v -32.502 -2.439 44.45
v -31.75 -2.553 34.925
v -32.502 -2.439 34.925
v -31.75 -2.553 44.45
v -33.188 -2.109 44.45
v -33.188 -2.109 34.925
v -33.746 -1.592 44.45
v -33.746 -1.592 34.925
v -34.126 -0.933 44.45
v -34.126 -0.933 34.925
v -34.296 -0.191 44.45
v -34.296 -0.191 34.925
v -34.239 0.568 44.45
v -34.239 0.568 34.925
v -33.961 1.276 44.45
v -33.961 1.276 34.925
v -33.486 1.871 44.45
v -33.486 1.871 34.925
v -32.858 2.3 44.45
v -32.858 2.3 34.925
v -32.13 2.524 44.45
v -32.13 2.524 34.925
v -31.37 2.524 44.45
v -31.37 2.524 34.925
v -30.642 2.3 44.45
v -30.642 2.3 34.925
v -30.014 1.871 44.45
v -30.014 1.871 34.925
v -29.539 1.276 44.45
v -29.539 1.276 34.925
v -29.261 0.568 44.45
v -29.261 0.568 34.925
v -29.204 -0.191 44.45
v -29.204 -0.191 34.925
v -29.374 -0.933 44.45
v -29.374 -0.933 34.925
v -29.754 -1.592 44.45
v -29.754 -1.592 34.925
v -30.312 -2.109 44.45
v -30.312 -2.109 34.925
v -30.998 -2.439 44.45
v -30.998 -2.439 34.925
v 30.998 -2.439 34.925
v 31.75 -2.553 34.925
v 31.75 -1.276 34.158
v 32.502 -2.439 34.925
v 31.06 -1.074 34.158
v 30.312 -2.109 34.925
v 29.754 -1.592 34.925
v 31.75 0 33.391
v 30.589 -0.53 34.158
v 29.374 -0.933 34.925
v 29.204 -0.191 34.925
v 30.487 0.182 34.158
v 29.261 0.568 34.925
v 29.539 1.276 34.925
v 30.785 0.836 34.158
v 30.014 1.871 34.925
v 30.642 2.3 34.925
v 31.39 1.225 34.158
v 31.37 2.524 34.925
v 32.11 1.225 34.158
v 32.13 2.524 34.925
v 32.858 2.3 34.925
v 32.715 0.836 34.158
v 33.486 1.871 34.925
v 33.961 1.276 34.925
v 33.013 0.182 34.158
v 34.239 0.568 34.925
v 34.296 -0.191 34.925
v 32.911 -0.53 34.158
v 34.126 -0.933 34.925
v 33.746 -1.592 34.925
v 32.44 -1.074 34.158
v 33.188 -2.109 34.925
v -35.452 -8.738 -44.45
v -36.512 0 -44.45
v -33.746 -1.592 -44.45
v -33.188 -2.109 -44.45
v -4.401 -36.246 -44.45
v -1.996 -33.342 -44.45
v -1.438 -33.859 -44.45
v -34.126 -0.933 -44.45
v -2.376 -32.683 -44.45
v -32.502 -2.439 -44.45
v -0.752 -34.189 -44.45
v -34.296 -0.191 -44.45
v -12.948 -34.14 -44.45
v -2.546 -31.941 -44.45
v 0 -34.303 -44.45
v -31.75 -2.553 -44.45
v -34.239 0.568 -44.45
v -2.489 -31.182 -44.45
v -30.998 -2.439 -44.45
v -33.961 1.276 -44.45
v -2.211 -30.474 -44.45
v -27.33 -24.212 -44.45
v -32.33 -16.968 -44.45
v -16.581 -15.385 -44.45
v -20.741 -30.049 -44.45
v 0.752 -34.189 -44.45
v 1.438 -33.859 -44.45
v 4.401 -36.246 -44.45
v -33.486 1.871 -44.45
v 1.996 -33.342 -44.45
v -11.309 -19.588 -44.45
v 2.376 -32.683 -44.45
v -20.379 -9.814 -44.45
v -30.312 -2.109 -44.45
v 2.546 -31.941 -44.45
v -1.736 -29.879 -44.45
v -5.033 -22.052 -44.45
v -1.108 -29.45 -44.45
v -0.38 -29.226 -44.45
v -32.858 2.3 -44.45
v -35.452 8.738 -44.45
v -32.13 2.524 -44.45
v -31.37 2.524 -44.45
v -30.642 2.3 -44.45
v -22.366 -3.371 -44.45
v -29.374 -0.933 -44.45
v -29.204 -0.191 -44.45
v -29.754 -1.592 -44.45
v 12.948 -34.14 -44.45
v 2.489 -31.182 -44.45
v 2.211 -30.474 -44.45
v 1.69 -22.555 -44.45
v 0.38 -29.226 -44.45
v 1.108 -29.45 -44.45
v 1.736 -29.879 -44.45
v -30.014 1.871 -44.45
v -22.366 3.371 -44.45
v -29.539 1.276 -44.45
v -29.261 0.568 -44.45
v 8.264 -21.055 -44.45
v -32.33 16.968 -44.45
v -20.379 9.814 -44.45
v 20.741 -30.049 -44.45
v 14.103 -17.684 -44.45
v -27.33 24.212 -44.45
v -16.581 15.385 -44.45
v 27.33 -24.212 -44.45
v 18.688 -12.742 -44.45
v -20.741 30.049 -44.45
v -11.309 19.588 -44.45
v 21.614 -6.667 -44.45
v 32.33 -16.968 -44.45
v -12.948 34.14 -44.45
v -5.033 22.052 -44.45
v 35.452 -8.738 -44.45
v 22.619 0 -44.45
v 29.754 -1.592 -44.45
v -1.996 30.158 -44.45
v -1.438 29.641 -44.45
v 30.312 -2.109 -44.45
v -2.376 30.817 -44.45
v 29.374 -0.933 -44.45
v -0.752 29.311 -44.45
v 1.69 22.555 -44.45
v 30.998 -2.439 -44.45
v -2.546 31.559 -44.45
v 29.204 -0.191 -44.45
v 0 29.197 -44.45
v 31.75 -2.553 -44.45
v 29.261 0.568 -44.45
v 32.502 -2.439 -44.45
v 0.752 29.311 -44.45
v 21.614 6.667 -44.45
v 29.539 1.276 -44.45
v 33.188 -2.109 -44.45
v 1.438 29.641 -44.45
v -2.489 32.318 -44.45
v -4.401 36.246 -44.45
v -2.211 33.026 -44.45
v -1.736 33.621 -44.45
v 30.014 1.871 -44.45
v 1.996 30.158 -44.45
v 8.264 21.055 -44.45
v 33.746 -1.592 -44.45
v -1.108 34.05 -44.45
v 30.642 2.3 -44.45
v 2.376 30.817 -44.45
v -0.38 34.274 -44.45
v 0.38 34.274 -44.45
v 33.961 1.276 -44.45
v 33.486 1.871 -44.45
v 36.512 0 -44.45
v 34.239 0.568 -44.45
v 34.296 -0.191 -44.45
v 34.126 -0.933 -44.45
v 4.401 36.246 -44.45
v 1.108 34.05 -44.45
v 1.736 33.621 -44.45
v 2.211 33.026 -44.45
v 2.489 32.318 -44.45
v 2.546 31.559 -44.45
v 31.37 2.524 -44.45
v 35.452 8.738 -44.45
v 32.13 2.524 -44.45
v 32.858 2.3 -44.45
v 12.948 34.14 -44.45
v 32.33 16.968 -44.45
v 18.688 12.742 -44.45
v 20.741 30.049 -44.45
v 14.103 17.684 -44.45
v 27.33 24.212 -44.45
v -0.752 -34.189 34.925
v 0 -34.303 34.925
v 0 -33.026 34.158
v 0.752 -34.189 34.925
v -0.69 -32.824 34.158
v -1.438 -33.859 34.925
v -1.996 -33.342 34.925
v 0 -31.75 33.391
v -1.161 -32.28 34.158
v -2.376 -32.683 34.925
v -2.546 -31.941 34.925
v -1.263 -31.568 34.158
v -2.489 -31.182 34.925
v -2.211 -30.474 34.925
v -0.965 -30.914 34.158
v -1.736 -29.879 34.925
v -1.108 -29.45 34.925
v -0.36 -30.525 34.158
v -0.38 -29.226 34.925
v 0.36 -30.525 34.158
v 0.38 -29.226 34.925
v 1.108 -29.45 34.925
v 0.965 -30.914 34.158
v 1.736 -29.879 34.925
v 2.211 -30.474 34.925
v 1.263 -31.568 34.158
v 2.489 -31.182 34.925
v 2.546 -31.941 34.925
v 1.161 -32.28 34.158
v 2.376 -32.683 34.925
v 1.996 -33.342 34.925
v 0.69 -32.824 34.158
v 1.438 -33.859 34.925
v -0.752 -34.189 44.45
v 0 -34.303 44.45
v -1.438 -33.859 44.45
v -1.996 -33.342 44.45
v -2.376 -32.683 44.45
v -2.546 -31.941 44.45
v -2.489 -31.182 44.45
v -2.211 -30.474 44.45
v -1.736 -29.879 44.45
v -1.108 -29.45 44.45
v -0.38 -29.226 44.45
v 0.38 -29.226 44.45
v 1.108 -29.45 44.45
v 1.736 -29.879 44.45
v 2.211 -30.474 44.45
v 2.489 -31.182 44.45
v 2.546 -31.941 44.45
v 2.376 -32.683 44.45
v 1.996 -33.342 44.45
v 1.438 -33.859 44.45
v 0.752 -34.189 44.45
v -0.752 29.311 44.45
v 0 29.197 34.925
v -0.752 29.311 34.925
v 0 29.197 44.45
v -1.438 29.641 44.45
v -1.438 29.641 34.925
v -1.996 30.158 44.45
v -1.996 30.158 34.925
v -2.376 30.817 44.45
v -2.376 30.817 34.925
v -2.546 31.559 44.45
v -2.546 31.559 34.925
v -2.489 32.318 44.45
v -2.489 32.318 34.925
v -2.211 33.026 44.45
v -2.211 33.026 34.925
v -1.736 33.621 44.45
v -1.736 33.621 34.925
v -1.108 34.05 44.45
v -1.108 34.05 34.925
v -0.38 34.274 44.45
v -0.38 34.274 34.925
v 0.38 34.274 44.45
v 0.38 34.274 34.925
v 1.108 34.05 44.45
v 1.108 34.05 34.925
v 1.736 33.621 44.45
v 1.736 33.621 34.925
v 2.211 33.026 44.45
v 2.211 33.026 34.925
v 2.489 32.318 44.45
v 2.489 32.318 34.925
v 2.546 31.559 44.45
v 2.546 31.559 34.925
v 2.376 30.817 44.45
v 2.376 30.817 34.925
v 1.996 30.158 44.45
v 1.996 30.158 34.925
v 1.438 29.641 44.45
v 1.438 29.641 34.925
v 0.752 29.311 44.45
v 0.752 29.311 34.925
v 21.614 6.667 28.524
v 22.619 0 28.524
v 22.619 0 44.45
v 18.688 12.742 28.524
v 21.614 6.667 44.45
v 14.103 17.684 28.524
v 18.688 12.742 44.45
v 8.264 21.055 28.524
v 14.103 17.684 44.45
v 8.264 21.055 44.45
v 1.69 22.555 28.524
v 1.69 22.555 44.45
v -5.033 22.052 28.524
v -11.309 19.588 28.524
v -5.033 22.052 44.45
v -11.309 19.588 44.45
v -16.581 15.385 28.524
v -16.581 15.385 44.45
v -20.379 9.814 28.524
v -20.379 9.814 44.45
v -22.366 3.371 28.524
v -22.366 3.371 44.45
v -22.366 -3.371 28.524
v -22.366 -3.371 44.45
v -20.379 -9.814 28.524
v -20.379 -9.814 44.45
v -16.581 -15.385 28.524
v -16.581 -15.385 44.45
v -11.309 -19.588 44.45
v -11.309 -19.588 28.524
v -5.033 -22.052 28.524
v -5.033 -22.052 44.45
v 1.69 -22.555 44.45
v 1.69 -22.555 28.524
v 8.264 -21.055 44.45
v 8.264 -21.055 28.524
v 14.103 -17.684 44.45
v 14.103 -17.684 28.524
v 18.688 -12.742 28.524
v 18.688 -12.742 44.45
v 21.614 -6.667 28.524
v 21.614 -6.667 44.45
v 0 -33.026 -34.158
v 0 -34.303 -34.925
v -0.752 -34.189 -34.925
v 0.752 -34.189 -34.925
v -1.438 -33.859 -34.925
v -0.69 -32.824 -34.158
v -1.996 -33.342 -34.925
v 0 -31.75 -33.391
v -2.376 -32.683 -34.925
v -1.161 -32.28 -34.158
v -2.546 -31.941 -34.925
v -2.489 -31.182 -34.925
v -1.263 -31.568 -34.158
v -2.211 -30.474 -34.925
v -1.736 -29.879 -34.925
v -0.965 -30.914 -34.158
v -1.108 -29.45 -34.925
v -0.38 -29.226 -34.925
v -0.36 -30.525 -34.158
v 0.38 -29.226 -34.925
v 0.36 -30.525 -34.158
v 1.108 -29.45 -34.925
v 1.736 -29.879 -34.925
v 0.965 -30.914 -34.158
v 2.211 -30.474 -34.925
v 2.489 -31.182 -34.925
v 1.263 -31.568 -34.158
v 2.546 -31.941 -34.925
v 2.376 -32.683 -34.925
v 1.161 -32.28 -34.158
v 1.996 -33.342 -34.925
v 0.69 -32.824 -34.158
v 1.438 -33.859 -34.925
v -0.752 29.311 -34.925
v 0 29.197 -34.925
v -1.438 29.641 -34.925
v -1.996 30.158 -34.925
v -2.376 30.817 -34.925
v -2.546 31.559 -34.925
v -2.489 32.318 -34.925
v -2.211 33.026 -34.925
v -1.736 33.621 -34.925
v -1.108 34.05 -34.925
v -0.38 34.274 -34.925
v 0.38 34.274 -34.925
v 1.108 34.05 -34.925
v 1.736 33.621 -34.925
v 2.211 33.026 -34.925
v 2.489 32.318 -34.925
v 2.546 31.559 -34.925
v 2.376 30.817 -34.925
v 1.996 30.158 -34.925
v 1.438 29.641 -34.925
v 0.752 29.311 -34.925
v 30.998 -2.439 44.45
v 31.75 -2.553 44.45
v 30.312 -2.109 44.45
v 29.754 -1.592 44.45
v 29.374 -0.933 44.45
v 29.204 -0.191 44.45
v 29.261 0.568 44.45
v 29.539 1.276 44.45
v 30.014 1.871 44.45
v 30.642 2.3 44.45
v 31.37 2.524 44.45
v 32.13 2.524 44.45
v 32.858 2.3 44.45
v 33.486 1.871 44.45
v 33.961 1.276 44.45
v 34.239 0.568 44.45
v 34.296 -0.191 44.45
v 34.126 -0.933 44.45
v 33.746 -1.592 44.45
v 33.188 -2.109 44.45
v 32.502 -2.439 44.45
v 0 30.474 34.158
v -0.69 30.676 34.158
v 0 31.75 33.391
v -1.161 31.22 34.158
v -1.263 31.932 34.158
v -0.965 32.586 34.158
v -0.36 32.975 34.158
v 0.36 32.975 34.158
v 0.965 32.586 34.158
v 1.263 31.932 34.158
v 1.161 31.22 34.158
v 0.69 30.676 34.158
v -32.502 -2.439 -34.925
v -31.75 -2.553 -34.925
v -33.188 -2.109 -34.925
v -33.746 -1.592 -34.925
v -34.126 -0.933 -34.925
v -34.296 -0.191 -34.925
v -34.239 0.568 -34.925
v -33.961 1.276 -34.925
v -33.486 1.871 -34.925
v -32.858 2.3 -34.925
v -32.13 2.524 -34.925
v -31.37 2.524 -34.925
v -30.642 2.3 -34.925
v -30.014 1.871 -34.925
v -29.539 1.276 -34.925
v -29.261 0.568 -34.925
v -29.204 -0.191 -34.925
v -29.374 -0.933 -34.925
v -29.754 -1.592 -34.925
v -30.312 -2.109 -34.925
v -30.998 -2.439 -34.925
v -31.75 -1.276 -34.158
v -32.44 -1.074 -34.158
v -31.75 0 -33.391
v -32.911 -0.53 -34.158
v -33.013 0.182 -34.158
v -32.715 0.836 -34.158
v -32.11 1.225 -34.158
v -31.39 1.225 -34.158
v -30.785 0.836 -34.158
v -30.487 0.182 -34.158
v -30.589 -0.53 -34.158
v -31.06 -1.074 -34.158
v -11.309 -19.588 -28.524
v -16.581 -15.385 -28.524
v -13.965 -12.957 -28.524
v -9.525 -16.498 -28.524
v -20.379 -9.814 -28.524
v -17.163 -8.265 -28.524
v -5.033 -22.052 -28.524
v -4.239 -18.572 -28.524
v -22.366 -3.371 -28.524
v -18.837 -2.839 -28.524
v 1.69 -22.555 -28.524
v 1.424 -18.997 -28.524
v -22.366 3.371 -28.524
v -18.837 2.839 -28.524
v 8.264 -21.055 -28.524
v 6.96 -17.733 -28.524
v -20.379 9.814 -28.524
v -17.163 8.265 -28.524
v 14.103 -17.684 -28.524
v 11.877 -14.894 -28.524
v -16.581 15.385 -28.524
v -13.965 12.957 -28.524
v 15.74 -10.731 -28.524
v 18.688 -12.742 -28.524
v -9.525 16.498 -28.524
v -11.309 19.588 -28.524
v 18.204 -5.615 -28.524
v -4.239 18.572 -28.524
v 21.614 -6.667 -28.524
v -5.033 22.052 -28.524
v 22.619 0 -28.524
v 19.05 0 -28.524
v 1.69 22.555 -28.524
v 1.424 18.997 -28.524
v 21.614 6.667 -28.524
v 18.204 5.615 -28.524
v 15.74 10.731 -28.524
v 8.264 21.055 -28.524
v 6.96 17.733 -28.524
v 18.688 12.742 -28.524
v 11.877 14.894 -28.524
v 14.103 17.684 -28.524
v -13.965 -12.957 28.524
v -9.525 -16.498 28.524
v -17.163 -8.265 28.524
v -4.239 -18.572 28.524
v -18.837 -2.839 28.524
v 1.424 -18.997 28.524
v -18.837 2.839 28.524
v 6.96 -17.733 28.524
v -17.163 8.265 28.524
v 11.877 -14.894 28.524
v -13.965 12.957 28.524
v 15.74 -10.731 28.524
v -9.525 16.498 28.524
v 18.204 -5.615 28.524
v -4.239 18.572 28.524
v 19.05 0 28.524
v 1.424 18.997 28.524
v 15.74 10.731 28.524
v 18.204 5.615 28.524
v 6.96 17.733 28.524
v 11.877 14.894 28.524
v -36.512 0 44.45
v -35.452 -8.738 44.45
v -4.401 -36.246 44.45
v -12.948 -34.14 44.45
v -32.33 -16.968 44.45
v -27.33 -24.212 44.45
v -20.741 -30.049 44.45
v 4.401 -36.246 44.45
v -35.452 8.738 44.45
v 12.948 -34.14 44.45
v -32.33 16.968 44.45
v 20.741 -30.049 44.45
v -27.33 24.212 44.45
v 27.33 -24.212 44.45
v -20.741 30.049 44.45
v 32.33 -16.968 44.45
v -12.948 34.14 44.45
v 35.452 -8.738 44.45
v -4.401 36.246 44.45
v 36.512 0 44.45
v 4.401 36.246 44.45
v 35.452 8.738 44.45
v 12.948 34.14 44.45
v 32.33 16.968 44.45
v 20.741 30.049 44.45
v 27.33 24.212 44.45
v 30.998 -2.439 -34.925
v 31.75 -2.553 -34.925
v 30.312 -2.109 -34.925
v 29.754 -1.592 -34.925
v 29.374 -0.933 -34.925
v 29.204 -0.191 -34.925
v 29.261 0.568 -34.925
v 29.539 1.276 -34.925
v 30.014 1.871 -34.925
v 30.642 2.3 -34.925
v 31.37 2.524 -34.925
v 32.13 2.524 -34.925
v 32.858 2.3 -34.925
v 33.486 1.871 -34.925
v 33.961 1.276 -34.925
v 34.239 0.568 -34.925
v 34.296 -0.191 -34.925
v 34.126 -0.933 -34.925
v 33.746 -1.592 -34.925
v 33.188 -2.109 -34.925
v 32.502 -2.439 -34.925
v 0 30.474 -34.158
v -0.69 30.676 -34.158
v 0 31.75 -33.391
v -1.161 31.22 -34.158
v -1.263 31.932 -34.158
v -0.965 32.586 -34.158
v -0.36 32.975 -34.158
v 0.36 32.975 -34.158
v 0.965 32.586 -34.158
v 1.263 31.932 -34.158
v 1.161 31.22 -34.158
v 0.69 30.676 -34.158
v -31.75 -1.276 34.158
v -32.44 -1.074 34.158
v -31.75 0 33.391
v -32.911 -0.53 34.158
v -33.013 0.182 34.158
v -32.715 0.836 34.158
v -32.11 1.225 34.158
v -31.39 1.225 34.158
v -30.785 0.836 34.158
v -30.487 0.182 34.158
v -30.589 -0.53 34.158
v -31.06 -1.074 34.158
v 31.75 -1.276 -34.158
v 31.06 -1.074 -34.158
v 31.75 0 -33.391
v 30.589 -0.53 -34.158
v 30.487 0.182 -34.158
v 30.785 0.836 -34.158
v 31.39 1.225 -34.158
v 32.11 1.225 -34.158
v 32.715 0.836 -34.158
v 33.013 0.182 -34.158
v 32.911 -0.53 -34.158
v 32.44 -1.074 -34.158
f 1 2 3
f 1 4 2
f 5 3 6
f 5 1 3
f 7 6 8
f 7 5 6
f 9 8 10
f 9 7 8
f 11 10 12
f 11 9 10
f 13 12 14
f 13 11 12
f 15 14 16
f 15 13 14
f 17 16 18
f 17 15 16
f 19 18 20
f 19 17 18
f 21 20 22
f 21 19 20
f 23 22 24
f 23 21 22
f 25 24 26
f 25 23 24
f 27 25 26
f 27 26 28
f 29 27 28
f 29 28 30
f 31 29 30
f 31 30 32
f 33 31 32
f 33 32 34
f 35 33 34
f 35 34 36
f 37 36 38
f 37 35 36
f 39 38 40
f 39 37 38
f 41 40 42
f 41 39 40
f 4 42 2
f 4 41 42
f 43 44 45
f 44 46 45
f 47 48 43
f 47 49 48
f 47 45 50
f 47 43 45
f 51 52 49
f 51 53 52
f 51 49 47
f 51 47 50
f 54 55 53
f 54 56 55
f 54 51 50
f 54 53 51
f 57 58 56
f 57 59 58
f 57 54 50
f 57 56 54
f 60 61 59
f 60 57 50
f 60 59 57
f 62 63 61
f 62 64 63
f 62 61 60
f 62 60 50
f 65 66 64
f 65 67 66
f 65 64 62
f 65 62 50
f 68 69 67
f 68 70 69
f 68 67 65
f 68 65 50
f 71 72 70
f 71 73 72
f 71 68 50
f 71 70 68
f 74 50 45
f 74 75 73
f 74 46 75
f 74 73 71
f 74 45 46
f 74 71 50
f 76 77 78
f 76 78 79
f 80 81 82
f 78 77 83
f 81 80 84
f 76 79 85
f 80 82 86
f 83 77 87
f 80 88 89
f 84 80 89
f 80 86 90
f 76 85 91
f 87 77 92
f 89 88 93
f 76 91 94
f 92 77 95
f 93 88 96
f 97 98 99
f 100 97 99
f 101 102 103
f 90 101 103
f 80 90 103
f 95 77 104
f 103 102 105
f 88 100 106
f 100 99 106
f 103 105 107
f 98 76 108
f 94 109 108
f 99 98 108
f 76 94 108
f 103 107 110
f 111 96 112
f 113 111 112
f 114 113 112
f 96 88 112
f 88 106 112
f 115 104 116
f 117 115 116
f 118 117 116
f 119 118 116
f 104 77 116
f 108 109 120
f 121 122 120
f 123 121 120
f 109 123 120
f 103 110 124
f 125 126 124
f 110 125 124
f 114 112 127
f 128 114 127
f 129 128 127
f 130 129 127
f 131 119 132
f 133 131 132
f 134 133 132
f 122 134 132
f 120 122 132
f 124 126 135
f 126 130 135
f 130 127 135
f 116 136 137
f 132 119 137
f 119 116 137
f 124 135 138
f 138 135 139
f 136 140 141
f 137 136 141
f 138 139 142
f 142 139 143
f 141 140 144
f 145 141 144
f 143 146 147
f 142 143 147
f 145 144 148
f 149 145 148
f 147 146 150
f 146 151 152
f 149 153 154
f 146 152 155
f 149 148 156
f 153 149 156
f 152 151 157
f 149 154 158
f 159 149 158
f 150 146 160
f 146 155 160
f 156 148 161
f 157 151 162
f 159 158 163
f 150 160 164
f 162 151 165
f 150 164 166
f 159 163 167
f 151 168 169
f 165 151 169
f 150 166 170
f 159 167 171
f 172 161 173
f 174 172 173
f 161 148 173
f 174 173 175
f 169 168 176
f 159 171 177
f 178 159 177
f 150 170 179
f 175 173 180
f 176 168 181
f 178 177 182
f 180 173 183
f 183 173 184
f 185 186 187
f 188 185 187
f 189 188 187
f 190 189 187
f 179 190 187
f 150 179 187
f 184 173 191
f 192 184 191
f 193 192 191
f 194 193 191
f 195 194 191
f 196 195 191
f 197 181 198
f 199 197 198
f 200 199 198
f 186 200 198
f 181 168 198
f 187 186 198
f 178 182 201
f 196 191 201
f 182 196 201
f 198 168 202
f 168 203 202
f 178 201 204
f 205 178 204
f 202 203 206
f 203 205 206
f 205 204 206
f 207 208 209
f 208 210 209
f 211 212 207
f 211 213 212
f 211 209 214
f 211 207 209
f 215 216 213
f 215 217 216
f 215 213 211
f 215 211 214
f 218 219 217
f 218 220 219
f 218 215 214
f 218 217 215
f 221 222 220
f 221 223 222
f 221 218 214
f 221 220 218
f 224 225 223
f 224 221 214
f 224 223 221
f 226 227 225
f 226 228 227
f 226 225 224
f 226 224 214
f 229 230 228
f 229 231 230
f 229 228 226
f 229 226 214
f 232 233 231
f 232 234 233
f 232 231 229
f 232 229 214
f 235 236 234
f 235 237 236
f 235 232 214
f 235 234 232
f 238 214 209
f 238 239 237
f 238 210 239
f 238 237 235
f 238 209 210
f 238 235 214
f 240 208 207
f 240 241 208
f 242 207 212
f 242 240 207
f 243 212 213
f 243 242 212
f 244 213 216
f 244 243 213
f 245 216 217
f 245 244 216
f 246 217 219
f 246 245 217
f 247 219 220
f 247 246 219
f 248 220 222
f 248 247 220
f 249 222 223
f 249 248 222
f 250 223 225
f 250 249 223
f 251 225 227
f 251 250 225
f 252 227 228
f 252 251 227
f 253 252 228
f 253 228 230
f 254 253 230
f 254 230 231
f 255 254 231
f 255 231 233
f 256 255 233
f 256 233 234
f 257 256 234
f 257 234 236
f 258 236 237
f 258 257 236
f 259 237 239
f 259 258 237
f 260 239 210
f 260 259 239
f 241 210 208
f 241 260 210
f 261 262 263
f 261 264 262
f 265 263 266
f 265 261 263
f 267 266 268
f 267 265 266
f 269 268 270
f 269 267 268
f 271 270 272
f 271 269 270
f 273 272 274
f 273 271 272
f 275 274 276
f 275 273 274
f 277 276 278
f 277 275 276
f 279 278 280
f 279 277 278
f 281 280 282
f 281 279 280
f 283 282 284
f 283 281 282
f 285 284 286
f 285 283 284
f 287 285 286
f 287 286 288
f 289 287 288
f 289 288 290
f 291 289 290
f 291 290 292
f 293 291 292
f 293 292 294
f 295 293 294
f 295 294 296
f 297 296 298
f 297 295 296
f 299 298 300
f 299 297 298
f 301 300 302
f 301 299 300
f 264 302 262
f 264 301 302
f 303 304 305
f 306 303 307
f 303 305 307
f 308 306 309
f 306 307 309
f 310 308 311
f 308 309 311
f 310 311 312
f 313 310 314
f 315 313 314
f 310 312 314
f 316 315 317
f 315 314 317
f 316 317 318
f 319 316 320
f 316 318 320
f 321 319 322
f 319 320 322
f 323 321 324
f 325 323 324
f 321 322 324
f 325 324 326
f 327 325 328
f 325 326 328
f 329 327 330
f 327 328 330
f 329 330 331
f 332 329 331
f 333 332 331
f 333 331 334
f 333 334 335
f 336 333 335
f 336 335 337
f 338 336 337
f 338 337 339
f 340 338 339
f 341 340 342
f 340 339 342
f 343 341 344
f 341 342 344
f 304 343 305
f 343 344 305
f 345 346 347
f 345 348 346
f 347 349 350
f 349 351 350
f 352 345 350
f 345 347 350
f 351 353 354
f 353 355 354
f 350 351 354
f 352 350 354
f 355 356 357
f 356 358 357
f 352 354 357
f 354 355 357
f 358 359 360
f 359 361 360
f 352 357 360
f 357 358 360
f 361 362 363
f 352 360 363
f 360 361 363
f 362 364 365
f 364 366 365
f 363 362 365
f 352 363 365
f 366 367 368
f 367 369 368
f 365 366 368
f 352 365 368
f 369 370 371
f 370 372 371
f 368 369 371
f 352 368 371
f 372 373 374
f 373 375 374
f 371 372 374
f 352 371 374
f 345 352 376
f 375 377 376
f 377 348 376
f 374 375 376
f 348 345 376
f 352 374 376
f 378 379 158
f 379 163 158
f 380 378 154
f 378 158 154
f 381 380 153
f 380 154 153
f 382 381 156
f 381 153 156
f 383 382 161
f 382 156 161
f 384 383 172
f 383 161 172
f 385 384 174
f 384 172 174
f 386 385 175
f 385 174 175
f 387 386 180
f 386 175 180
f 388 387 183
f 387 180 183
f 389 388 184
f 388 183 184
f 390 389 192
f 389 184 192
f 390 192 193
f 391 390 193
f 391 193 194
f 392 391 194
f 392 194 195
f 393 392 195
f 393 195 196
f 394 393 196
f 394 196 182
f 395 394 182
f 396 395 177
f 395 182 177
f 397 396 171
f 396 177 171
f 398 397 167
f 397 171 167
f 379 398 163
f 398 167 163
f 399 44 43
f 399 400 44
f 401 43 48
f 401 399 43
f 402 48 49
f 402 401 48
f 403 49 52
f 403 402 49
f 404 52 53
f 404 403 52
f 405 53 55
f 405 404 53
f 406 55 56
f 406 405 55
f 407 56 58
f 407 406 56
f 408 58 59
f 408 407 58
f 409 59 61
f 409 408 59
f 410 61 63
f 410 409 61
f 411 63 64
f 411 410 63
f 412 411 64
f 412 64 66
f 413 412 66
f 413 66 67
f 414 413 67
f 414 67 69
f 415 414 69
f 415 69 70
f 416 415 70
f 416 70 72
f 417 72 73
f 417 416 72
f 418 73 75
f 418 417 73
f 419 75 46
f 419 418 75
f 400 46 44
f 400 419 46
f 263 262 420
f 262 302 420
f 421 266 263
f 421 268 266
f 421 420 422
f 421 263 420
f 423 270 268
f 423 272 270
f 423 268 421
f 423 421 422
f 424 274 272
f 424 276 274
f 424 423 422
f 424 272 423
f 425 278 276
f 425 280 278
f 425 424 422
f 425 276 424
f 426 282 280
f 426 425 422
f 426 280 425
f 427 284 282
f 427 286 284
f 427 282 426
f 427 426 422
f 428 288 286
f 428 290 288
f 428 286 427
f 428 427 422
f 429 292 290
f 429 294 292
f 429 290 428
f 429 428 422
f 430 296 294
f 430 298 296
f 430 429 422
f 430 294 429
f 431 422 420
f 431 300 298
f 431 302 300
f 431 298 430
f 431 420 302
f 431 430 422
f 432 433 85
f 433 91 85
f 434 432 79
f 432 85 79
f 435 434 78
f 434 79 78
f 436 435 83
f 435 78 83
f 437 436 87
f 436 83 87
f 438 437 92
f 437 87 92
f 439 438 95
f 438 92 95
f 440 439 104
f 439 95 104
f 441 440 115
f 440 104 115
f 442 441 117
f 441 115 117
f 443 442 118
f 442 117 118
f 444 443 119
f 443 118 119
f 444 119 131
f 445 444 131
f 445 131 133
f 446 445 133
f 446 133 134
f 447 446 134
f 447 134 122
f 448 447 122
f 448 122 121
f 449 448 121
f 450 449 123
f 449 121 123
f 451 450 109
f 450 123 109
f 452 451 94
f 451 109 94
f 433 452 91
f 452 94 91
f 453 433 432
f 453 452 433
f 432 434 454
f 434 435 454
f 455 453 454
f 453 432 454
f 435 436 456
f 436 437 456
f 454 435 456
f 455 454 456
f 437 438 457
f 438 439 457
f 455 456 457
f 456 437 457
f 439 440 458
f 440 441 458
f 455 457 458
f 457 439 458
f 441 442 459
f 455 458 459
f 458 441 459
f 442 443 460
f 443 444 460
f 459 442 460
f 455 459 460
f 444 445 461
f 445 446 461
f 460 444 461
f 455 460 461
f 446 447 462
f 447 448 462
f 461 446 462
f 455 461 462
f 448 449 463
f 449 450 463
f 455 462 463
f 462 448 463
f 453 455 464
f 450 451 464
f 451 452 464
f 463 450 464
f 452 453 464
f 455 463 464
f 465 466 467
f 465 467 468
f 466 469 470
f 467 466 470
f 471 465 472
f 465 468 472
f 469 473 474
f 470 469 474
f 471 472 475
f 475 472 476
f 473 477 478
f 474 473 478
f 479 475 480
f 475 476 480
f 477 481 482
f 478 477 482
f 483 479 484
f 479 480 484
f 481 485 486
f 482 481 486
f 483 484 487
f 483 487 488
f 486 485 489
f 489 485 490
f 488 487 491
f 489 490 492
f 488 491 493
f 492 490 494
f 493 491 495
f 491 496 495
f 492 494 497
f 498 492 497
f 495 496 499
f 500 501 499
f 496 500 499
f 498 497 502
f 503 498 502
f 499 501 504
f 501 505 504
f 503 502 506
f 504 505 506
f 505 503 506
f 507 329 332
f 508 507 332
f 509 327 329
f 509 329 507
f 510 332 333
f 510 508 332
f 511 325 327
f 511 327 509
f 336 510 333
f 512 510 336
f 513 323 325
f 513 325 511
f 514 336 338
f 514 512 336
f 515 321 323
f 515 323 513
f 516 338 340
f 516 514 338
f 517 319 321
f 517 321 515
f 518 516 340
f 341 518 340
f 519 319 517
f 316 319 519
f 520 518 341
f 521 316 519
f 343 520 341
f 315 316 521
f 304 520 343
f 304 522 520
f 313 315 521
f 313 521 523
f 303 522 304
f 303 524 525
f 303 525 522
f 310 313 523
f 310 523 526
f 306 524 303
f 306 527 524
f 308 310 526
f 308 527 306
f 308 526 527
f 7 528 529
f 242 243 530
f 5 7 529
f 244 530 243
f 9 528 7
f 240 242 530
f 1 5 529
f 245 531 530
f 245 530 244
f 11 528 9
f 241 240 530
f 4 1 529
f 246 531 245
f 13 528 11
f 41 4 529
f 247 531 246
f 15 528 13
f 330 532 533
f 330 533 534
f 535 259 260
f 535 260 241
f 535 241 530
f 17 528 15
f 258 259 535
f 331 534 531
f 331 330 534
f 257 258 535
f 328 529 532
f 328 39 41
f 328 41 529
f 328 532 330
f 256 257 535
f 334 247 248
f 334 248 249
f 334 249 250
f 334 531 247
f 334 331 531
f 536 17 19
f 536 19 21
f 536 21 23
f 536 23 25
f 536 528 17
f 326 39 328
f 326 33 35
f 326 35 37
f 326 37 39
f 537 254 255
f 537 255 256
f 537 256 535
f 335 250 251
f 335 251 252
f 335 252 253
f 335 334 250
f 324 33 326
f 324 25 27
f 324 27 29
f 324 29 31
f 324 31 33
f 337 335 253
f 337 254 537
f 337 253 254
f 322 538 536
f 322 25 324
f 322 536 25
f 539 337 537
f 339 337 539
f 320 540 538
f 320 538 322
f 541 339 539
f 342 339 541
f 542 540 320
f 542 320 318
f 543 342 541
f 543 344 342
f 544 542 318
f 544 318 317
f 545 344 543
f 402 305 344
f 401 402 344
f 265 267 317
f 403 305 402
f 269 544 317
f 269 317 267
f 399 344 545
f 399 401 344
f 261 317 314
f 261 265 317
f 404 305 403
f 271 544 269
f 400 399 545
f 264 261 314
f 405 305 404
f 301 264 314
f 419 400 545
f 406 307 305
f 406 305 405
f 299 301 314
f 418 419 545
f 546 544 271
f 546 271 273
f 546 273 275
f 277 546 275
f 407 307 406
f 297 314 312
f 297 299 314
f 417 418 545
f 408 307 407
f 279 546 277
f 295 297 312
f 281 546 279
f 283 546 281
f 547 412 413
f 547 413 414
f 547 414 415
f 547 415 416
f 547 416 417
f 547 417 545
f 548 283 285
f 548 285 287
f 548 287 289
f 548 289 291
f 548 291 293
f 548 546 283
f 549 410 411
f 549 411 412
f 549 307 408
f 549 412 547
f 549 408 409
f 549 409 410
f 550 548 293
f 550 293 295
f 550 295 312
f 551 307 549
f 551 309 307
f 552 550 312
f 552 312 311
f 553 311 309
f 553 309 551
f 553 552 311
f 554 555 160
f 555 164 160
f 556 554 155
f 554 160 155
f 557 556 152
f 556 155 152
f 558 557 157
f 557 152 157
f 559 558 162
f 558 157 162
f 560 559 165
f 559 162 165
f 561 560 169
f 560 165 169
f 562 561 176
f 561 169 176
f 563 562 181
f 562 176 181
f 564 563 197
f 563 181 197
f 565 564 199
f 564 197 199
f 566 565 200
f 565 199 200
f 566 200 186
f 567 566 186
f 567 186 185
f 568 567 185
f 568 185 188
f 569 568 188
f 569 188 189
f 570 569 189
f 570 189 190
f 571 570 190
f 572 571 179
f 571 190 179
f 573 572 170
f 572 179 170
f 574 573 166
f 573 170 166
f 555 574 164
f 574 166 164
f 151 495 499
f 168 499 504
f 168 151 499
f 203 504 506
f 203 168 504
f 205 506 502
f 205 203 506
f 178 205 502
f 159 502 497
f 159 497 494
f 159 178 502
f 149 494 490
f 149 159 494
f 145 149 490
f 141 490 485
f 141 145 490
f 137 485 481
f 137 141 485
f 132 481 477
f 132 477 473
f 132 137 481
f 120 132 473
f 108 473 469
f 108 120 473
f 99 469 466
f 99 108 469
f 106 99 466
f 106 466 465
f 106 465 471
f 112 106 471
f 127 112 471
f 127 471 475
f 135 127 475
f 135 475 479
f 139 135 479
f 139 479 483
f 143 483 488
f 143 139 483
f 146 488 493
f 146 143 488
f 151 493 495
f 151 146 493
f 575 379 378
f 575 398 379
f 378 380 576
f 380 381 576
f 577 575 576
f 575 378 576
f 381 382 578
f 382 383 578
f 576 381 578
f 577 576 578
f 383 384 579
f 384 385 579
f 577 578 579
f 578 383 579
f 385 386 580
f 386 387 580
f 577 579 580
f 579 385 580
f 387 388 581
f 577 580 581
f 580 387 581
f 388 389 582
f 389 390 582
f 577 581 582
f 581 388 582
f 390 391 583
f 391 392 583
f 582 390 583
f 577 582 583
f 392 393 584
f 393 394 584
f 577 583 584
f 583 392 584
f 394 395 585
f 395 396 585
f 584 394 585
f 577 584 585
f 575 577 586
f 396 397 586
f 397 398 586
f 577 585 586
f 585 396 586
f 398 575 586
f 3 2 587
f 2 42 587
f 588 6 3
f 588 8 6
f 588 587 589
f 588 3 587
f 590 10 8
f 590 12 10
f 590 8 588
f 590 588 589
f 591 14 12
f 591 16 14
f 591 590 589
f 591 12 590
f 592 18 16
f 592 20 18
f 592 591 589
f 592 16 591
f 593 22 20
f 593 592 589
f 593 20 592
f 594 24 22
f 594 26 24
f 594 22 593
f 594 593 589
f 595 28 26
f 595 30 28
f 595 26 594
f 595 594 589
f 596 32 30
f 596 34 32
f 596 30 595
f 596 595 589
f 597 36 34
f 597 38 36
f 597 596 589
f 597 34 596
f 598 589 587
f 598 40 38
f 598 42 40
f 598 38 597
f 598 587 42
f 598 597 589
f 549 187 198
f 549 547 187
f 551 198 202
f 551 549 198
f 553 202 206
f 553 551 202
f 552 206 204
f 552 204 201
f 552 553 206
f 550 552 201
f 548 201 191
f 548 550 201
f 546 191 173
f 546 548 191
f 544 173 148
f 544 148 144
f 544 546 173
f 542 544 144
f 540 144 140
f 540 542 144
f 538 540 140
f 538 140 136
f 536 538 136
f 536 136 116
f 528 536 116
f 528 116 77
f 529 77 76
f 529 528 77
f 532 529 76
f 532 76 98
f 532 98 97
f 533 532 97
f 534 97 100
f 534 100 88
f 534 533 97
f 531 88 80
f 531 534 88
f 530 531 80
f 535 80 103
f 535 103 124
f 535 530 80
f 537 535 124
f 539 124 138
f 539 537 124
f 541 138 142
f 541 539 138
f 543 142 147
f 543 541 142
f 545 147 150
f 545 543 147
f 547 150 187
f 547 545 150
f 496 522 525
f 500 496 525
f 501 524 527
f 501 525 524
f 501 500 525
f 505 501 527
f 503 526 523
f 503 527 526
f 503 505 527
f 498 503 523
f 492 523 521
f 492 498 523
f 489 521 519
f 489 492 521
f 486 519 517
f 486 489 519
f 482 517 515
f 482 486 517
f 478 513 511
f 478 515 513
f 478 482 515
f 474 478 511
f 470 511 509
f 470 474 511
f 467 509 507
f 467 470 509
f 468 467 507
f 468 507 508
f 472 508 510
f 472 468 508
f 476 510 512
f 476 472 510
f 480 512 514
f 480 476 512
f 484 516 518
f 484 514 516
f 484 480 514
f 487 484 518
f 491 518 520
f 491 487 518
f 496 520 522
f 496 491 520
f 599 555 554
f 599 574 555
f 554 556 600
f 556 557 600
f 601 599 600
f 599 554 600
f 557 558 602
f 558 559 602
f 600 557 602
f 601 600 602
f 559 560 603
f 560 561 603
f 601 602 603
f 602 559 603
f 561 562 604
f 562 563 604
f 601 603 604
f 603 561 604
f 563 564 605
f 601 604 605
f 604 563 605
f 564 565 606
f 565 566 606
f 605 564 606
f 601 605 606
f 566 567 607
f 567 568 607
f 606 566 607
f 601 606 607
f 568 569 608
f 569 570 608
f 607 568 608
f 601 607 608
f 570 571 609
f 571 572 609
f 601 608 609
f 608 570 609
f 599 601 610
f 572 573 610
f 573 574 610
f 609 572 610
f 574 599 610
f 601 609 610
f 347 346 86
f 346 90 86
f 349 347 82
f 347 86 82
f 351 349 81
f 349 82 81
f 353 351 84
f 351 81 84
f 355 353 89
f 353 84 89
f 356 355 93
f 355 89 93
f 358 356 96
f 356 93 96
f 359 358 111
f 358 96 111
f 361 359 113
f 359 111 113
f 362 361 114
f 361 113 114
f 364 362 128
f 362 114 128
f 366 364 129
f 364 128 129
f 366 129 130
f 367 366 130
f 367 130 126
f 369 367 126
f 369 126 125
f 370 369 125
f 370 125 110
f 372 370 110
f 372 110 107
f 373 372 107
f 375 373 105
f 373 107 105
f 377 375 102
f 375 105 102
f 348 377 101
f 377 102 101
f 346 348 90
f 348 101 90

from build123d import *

# Parameters (mm, degrees)
SKETCH1_R                                 = 36.5125
SKETCH1_R_2                               = 19.05
EXTRUDE1_DEPTH                            = 44.45
SKETCH3_R                                 = 22.6187
OUTER_RACE_POCKET_MASTER_DEPTH            = 15.9258
F_1_4_20_THREAD_PATTERN_MASTER_AT_2_COUNT = 2
F_1_4_20_THREAD_PATTERN_MASTER_AT_2_PITCH = 44.901280605
F_1_4_20_THREAD_PATTERN_MASTER_AT_3_COUNT = 2
F_1_4_20_THREAD_PATTERN_MASTER_AT_3_PITCH = 63.5
F_1_4_20_THREAD_PATTERN_MASTER_AT_4_COUNT = 2
F_1_4_20_THREAD_PATTERN_MASTER_AT_4_PITCH = 44.901280605


with BuildPart() as part:
    # Sketch1 → Extrude1 (new, symmetric)
    with BuildSketch(Plane.XY):
        Circle(SKETCH1_R)
        Circle(SKETCH1_R_2, mode=Mode.SUBTRACT)
    extrude(amount=EXTRUDE1_DEPTH, both=True)

    # Sketch3 → Outer race pocket master (cut)
    with BuildSketch(Plane.XY.offset(44.45)):
        Circle(SKETCH3_R)
    outer_race_pocket_master = extrude(amount=-OUTER_RACE_POCKET_MASTER_DEPTH, mode=Mode.SUBTRACT)

    # Sketch8 → 1/4-20 thread pattern master (revolve, cut)
    with BuildSketch(Plane(origin=(0, 31.75, 44.45), x_dir=(0, -1, 0), z_dir=(1, 0, 0))):
        Polygon((0, 0), (0, 11.058816902), (2.5527, 9.525), (2.5527, 0), align=None)
    f_1_4_20_thread_pattern_master = revolve(axis=Axis((0, 31.75, 50.8), (0, 0, -1)), mode=Mode.SUBTRACT)

    # 1/4-20 thread pattern master at 2: 1/4-20 thread pattern master ×2
    with Locations(*[Vector(0.7071067811865476, -0.7071067811865476, 0) * (i * F_1_4_20_THREAD_PATTERN_MASTER_AT_2_PITCH) for i in range(1, F_1_4_20_THREAD_PATTERN_MASTER_AT_2_COUNT)]):
        add(f_1_4_20_thread_pattern_master, mode=Mode.SUBTRACT)

    # 1/4-20 thread pattern master at 3: 1/4-20 thread pattern master ×2
    with Locations(*[(0, -i * F_1_4_20_THREAD_PATTERN_MASTER_AT_3_PITCH, 0) for i in range(1, F_1_4_20_THREAD_PATTERN_MASTER_AT_3_COUNT)]):
        add(f_1_4_20_thread_pattern_master, mode=Mode.SUBTRACT)

    # 1/4-20 thread pattern master at 4: 1/4-20 thread pattern master ×2
    with Locations(*[Vector(-0.7071067811865476, -0.7071067811865476, 0) * (i * F_1_4_20_THREAD_PATTERN_MASTER_AT_4_PITCH) for i in range(1, F_1_4_20_THREAD_PATTERN_MASTER_AT_4_COUNT)]):
        add(f_1_4_20_thread_pattern_master, mode=Mode.SUBTRACT)

    # Pocket and thread mirror: Outer race pocket master, 1/4-20 thread pattern master across plane
    add(outer_race_pocket_master.mirror(Plane.XY), mode=Mode.SUBTRACT)
    add(f_1_4_20_thread_pattern_master.mirror(Plane.XY), mode=Mode.SUBTRACT)

    # Pocket and thread mirror copy 1 sketch → Pocket and thread mirror copy 1 (revolve, cut)
    with BuildSketch(Plane(origin=(31.75, 0, -44.45), x_dir=(0, -1, 0), z_dir=(1, 0, 0))):
        Polygon((0, 0), (0, -11.058816902), (2.5527, -9.525), (2.5527, 0), align=None)
    revolve(axis=Axis((31.75, 0, -50.8), (0, 0, -1)), mode=Mode.SUBTRACT)

    # Pocket and thread mirror copy 2 sketch → Pocket and thread mirror copy 2 (revolve, cut)
    with BuildSketch(Plane(origin=(0, -31.75, -44.45), x_dir=(0, -1, 0), z_dir=(1, 0, 0))):
        Polygon((0, 0), (0, -11.058816902), (2.5527, -9.525), (2.5527, 0), align=None)
    revolve(axis=Axis((0, -31.75, -50.8), (0, 0, -1)), mode=Mode.SUBTRACT)

    # Pocket and thread mirror copy 3 sketch → Pocket and thread mirror copy 3 (revolve, cut)
    with BuildSketch(Plane(origin=(-31.75, 0, -44.45), x_dir=(0, -1, 0), z_dir=(1, 0, 0))):
        Polygon((0, 0), (0, -11.058816902), (2.5527, -9.525), (2.5527, 0), align=None)
    revolve(axis=Axis((-31.75, 0, -50.8), (0, 0, -1)), mode=Mode.SUBTRACT)


solid = part.part
